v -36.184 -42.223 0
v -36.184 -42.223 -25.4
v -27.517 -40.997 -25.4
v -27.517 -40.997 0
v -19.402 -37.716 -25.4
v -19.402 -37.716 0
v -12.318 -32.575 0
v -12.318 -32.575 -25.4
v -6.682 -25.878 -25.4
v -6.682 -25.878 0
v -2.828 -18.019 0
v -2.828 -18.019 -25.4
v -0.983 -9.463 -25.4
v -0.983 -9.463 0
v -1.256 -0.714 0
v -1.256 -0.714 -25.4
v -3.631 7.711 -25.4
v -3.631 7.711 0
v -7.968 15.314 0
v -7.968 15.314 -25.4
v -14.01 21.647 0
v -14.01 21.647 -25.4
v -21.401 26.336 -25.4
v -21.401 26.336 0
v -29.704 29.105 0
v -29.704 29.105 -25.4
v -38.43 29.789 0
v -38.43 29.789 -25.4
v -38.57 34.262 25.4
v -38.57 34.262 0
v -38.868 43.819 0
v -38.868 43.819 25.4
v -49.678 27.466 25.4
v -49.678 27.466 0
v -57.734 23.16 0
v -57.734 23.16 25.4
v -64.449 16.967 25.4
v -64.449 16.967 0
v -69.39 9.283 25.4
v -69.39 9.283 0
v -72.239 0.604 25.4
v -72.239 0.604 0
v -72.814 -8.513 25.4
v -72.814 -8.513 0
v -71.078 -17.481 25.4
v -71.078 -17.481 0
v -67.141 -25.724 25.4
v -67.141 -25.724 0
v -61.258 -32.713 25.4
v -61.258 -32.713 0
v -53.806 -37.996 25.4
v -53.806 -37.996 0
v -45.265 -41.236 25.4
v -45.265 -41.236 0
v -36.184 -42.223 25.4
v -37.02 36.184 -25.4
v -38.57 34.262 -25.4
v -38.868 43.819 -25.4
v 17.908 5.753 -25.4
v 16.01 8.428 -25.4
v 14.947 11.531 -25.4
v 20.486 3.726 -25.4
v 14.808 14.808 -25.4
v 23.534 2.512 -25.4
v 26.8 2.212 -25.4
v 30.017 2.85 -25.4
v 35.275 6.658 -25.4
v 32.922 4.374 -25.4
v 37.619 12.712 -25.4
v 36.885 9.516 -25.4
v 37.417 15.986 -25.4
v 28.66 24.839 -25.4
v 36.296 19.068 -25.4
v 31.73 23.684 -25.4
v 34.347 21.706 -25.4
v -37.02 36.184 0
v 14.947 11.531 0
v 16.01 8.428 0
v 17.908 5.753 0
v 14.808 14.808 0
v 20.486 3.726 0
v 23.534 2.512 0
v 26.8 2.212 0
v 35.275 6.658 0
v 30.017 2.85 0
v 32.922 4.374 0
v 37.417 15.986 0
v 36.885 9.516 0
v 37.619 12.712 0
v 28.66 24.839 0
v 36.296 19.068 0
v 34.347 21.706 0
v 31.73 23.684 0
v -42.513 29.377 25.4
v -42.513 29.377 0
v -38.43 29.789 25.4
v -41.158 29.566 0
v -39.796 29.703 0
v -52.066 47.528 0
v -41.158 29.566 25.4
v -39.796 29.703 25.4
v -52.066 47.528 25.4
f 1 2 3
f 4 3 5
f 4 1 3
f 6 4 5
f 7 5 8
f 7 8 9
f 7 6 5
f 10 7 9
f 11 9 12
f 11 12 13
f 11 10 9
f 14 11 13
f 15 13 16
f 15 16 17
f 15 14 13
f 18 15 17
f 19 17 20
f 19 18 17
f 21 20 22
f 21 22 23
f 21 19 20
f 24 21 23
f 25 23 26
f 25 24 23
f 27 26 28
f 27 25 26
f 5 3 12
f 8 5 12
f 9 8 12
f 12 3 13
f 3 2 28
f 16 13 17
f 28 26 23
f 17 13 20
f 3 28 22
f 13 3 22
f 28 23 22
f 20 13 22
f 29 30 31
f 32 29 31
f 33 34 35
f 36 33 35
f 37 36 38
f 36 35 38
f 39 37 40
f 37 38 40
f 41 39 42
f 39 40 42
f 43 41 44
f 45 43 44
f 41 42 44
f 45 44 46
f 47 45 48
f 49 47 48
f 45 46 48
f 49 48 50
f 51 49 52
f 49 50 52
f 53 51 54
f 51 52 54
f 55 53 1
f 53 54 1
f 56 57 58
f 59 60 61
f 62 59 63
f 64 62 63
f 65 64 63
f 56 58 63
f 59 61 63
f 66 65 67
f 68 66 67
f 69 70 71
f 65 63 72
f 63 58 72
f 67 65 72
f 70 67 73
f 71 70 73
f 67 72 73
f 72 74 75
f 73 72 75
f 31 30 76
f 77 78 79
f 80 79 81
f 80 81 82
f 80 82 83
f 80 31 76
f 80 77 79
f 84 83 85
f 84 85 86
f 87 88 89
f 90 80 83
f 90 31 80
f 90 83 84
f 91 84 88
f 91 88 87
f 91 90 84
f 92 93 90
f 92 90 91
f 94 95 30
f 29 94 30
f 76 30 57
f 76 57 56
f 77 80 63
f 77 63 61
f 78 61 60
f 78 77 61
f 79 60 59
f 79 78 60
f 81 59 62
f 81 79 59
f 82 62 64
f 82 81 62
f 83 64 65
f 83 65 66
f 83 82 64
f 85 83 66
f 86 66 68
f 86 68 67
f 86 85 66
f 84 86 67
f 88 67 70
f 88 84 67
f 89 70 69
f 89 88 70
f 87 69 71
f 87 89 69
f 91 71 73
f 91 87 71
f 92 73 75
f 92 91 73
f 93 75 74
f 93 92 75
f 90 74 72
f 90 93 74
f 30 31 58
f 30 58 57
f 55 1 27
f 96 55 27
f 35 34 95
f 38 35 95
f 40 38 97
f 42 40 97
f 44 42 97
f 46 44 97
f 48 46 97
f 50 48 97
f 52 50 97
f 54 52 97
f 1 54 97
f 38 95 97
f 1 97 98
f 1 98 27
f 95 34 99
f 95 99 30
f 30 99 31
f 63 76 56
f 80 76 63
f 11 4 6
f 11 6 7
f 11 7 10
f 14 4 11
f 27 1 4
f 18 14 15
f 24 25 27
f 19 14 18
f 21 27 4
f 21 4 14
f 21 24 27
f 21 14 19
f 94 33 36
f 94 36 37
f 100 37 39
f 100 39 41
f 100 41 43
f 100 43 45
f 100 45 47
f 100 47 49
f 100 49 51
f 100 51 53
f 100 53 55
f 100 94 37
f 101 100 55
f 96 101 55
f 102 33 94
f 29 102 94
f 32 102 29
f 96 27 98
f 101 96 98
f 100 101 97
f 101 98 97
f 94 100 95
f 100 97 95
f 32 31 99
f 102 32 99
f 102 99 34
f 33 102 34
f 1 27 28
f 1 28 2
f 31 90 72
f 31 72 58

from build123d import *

# Parameters (mm, degrees)
F1_DEPTH = 25.4
F2_DEPTH = 25.4


with BuildPart() as f1:
    # F0 (on Top) → F1 (new body)
    with BuildSketch(Plane.XY):
        with BuildLine():
            Line((-52.0662106574, 47.5283302367), (-49.6778525412, 27.4661201984))
            ThreePointArc((-49.6778525412, 27.4661201984), (-72.2312541518, -13.0522247362), (-36.1835278661, -42.2233342469))
            Line((-36.1835278661, -42.2233342469), (-38.4303892276, 29.7885758953))
            ThreePointArc((-38.4303892276, 29.7885758953), (-40.477450655, 29.6408565433), (-42.5127781928, 29.3768048286))
            Line((-42.5127781928, 29.3768048286), (-38.5699796106, 34.2624478869))
            Line((-38.5699796106, 34.2624478869), (-38.8681502061, 43.8188159378))
            Line((-38.8681502061, 43.8188159378), (-52.0662106574, 47.5283302367))
        make_face()
    extrude(amount=F1_DEPTH)


with BuildPart() as f2:
    # F0 (on Top) → F2 (new body)
    with BuildSketch(Plane.XY):
        with BuildLine():
            Line((-38.4303892276, 29.7885758953), (-36.1835278661, -42.2233342469))
            ThreePointArc((-36.1835278661, -42.2233342469), (-0.853297783, -5.0799795193), (-38.4303892276, 29.7885758953))
        make_face()
    extrude(amount=-F2_DEPTH)


with BuildPart() as f2b:
    # F0 (on Top) → F2, piece 2 (new body)
    with BuildSketch(Plane.XY):
        with BuildLine():
            Line((28.6603011191, 24.838924408), (-38.8681502061, 43.8188159378))
            Line((-38.8681502061, 43.8188159378), (-38.5699796106, 34.2624478869))
            Line((-38.5699796106, 34.2624478869), (-37.0195545256, 36.1836273223))
            Line((-37.0195545256, 36.1836273223), (14.8078221828, 14.8078212515))
            ThreePointArc((14.8078221828, 14.8078212515), (32.921649635, 4.3738430542), (28.6603011191, 24.838924408))
        make_face()
    extrude(amount=-F2_DEPTH)


solid = Compound([f1.part, f2.part, f2b.part])
